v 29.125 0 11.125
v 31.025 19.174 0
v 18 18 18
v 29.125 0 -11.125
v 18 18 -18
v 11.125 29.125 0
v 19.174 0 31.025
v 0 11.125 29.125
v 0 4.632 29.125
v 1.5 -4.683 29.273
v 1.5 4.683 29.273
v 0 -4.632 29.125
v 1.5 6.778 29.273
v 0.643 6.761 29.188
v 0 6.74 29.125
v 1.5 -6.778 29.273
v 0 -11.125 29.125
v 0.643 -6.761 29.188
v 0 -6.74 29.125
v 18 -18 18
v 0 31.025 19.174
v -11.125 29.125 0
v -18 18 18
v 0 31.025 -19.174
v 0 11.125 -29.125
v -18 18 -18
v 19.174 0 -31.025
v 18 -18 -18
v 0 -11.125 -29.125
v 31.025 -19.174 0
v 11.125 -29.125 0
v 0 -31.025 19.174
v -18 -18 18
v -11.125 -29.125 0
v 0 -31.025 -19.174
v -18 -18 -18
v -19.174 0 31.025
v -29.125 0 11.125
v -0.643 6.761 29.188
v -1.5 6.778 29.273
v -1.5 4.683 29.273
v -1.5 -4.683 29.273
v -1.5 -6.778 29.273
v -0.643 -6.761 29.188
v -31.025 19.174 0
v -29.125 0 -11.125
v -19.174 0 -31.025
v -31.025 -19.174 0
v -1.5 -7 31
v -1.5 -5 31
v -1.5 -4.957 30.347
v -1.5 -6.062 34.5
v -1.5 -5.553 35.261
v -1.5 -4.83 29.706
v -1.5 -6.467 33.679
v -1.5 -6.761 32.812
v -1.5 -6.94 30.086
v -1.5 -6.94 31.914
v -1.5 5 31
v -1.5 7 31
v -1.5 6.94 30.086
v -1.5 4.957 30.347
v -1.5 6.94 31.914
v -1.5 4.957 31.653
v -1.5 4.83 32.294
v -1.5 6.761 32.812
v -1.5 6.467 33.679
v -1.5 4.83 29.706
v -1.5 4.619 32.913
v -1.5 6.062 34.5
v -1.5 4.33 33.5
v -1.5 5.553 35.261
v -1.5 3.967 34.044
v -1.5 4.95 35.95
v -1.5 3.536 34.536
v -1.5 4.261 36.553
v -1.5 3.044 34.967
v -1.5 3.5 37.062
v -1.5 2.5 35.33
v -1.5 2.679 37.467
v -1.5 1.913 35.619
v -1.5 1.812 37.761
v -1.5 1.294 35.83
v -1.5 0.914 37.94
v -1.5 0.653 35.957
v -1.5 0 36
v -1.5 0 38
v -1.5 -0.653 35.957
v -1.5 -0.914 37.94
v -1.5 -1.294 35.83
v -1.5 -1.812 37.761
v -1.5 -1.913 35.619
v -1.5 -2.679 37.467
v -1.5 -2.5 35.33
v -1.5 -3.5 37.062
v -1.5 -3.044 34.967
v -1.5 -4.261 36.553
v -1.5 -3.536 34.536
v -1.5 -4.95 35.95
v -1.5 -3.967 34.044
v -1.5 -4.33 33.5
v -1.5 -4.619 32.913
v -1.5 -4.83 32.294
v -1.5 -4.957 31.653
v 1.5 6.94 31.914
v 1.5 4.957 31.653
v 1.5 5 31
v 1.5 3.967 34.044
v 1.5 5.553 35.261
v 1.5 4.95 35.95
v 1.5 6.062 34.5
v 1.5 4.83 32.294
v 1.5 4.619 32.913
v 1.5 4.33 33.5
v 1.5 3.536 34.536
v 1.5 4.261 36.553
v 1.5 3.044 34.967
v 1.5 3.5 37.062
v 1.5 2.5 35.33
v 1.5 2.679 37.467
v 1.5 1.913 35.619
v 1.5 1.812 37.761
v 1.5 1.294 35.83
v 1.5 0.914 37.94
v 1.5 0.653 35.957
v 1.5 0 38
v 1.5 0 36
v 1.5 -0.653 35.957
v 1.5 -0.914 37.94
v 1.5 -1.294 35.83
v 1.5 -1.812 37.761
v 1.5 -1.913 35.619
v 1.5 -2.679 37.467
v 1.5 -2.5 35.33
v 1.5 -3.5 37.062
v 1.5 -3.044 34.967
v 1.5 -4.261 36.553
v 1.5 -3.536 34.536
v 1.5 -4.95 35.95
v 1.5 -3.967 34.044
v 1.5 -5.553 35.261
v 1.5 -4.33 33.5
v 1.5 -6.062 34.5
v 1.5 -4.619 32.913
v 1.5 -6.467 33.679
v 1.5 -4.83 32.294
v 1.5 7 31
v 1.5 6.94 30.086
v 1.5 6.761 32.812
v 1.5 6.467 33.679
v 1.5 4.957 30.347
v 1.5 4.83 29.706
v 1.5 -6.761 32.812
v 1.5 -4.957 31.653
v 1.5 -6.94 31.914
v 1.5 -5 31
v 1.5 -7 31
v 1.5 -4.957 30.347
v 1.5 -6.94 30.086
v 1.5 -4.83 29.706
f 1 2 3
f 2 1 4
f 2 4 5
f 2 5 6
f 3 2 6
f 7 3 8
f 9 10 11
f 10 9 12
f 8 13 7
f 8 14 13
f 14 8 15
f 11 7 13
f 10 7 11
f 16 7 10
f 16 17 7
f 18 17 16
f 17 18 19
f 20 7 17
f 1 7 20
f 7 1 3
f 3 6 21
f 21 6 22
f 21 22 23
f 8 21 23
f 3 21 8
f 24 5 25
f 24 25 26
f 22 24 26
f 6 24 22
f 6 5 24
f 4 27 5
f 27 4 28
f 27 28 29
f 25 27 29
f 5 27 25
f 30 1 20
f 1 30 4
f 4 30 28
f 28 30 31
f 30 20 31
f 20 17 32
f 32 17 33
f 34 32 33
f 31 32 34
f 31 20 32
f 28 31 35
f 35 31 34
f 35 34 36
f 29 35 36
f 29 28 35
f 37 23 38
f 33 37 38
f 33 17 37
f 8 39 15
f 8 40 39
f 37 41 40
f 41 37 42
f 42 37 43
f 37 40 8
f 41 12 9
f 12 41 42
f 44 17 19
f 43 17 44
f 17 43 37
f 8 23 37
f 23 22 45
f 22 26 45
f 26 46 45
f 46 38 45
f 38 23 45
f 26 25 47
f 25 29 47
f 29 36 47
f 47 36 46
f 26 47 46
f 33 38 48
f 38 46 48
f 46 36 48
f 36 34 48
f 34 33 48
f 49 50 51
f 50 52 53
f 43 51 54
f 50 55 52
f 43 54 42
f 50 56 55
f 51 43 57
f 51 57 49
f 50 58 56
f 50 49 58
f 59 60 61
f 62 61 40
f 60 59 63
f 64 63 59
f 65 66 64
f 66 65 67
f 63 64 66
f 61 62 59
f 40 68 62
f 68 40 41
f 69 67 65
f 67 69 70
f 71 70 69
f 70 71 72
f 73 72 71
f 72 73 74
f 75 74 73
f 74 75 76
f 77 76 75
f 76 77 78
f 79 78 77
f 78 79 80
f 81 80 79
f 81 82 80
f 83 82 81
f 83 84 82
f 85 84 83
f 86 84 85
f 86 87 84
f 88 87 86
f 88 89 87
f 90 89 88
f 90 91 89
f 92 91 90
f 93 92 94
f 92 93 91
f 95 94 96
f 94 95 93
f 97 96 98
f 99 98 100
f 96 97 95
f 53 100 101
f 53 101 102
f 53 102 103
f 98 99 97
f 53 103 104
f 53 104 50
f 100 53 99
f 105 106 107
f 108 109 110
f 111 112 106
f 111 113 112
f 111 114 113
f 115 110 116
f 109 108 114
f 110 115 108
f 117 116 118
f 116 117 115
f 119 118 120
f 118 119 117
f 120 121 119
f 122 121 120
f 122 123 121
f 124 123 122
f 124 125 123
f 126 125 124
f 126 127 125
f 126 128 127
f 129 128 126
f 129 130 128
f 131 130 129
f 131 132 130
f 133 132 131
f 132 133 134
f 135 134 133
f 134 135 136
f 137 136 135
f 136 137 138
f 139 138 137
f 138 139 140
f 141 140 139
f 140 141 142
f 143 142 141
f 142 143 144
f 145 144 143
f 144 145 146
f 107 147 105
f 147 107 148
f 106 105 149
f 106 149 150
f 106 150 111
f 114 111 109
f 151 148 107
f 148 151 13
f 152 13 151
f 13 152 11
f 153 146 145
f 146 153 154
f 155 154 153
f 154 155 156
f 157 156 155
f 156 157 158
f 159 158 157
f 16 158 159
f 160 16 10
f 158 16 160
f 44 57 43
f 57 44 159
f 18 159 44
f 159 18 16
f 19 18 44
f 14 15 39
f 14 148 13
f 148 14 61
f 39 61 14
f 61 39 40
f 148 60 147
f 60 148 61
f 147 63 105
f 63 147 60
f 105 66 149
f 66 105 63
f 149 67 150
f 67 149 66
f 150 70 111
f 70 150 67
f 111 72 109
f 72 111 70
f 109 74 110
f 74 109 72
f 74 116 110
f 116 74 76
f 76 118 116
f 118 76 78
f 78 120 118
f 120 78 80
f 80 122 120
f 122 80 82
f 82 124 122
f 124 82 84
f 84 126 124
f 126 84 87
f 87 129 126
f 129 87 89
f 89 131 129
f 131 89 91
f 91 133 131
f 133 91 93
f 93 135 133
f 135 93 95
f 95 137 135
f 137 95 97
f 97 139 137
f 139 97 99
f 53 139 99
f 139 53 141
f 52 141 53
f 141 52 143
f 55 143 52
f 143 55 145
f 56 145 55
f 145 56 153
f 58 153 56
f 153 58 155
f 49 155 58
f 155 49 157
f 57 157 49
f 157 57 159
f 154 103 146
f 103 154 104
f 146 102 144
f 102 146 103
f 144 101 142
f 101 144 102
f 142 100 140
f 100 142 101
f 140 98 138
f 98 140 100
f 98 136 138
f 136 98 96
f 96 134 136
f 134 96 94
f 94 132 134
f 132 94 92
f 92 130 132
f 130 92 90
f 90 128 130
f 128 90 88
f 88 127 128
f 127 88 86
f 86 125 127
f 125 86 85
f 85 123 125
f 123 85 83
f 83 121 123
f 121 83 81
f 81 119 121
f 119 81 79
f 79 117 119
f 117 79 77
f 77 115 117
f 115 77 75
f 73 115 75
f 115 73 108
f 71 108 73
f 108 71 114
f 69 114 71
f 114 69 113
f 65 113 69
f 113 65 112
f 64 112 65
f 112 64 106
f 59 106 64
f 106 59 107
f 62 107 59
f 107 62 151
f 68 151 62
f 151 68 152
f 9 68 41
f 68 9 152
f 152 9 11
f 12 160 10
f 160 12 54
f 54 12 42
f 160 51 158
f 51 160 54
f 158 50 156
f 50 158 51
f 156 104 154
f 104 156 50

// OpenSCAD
/*
code makes 5 objects

mark = 1 small stellated dodecahedron
         with a hole in one of the
         pentagonal pyramids

mark = 2  polyhedron with inverted
          pentagonal pyramids for faces
          the faces are equilateral triangles

mark = 3  polyhedron with outward facing
          pentagonal pyramids for faces
          the faces are equilateral triangles

mark = 4  an approximate pentakis dodecahedron
          catalan solid - faces isoceles triangles

mark = 5  simple dodecahedron

the single parameter passed to small_stellated_dodecahedron
is a scale factor   positive for pentagonal pyramids that
face out - negative for pentagonal pyramids that face in

pcm

*/





//  mark = 1;
//  mark = 2;
//  mark = 3;
//  mark = 4;
//  mark = 5;


    mark = 3;



if (mark==2)

union()
{
scale(18)
small_stellated_dodecahedron(-.8944);
hanger2(30);
}

else

if (mark==3)

union()
{
scale(18)
small_stellated_dodecahedron(0.8944);
hanger2(31);
}

else

if (mark==4)

union()
{
scale(18)
small_stellated_dodecahedron(0.4279);
hanger2(31);
}

else

if (mark==5)

union()
{
scale(18)
small_stellated_dodecahedron(0);
hanger2(31);
}

else

if (mark==1)

difference()
{
scale(13)
small_stellated_dodecahedron(2.3417);
decoration(0.72361,0,1.17082,1.5,20,18,23);
}



module small_stellated_dodecahedron(scale)
{
a=scale*0.61803;
b=scale*0.38197;



/*
constructed from 12 pentagonal pyramids placed
on the faces of a dodecahedron.
first 20 points are the vertices of a dodecahedron
next 12 points are the vertices of the centers
of the faces of the dodecahedron

if scale = 0 a dodecahedron is created

if scale is positive the centers of the
faces are moved out fron the center of the
dodecahedron

if scale is negative the centers of the
faces are moved in towards the center of the
dodecahedron

the apex angles of the triangles that make up
the faces of the stellated dodecahedron
are 36 degrees - the scale factor that
makes a small stellated dodecahedron
is approximately 2.3417
length of side of pentagonal pyramid for
small stellated dodecahedron = 2

the apex angles of the triangles that make up
the faces of a pentakis dodecahedron ( one of
the Catalan solids) are about 68.619 degrees
the scale factor to make one is ca 0.4279

if len = length of the sides of the
pentagonal pyramid then approximately

scale = + or - sqrt((len*len/0.52786) - 2.09443)

lengths of the sides of the base are sqrt(5)-1
or 1.23607 to make equilateral triangles scale
factor is 0.8944

distance from centers of faces to origin ca 1.37638
distance from dodecahedral points to origin sqrt(3)




pcm

*/

polyhedron
       (points = [
                 [   1.00000,   1.00000,   1.00000],
                 [   1.00000,   1.00000,  -1.00000],
                 [   1.00000,  -1.00000,   1.00000],
                 [   1.00000,  -1.00000,  -1.00000],
                 [  -1.00000,   1.00000,   1.00000],
                 [  -1.00000,   1.00000,  -1.00000],
                 [  -1.00000,  -1.00000,   1.00000],
                 [  -1.00000,  -1.00000,  -1.00000],
                 [   0.00000,   0.61803,   1.61803],
                 [   0.00000,   0.61803,  -1.61803],
                 [   0.00000,  -0.61803,   1.61803],
                 [   0.00000,  -0.61803,  -1.61803],
                 [   0.61803,   1.61803,   0.00000],
                 [   0.61803,  -1.61803,   0.00000],
                 [  -0.61803,   1.61803,   0.00000],
                 [  -0.61803,  -1.61803,   0.00000],
                 [   1.61803,   0.00000,   0.61803],
                 [   1.61803,   0.00000,  -0.61803],
                 [  -1.61803,   0.00000,   0.61803],
                 [  -1.61803,   0.00000,  -0.61803],
                 [   1.17082+a,   0.72361+b,   0.00000],
                 [   0.72361+b,   0.00000,   1.17082+a],
                 [   0.00000,   1.17082+a,   0.72361+b],
                 [   0.00000,   1.17082+a,  -0.72361-b],
                 [   0.72361+b,   0.00000,  -1.17082-a],
                 [   1.17082+a,  -0.72361-b,   0.00000],
                 [   0.00000,  -1.17082-a,   0.72361+b],
                 [   0.00000,  -1.17082-a,  -0.72361-b],
                 [  -0.72361-b,   0.00000,   1.17082+a],
                 [  -1.17082-a,   0.72361+b,   0.00000],
                 [  -0.72361-b,   0.00000,  -1.17082-a],
                 [  -1.17082-a,  -0.72361-b,   0.00000],
                   ],

           faces = [

                [0,20,16],[16,20,17],[17,20,1],
                [1,20,12],[12,20,0],
                [0,21,8],[8,21,10],[10,21,2],
                [2,21,16],[16,21,0],
                 [0,22,12],[12,22,14],[14,22,4],
                [4,22,8],[8,22,0],
                [1,23,9],[9,23,5],[5,23,14],
                [14,23,12],[12,23,1],
                [1,24,17],[17,24,3],[3,24,11],
                [11,24,9],[9,24,1],
                [16,25,2],[17,25,16],[3,25,17],
                 [13,25,3],[2,25,13],
                 [2,26,10],[10,26,6],[6,26,15],
                 [15,26,13],[13,26,2],
                 [3,27,13],[13,27,15],[15,27,7],
                 [7,27,11],[11,27,3],
                [4,28,18],[18,28,6],[6,28,10],
                 [10,28,8],[8,28,4],
                 [4,29,14],[14,29,5],[5,29,19],
                 [19,29,18],[18,29,4],
                  [5,30,9],[9,30,11],[11,30,7],
                 [7,30,19],[19,30,5],
                 [6,31,18],[18,31,19],[19,31,7],
                 [7,31,15],[15,31,6],

                 ]
      );
}


module hanger(tr)
{

 translate([-1.50,0,tr])
   rotate([0,90,0])
   linear_extrude(height=3)
   difference()    {
  circle(center=true,r=8,$fn=48);
  circle(center=true,r=6,$fn=48);
   }
 }

module hanger2(tr)
{

 translate([-1.50,0,tr])
   rotate([0,90,0])
   linear_extrude(height=3)
   difference()    {
  circle(center=true,r=7,$fn=48);
  circle(center=true,r=5,$fn=48);
   }
 }

module decoration(x2,y2,z2,rc,hc,rz,r2)
{
translate(v=[r2*x2,r2*y2,r2*z2])
rotate(a = [-acos(z2/sqrt(x2*x2+y2*y2+z2*z2)), 0, -atan2(x2, y2)])
rotate([0,90,rz])
   cylinder(r=rc,h=hc,center=true,$fn=24);
}
